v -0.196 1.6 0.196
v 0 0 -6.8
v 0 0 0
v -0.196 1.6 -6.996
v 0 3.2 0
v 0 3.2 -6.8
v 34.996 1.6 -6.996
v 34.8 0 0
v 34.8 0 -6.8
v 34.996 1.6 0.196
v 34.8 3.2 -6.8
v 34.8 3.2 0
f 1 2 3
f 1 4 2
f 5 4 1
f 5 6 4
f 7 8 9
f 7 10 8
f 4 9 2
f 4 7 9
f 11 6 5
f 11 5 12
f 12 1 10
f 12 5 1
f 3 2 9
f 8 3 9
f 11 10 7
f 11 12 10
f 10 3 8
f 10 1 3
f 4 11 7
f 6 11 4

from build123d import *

# Parameters (mm, degrees)
ESQUISSE1_W        = 34.8
ESQUISSE1_H        = 6.8
BOSS_EXTRU_1_DEPTH = 1.6
BOSS_EXTRU_1_TAPER = -7
ESQUISSE2_W        = 35.192910594
ESQUISSE2_H        = 7.192910594
BOSS_EXTRU_2_DEPTH = 1.6
BOSS_EXTRU_2_TAPER = 7


with BuildPart() as part:
    # Esquisse1 → Boss.-Extru.1 (new body)
    with BuildSketch(Plane(origin=(0, 0, 0), x_dir=(1, 0, 0), z_dir=(0, 1, 0))):
        with Locations((17.4, 3.4)):
            Rectangle(ESQUISSE1_W, ESQUISSE1_H)
    extrude(amount=BOSS_EXTRU_1_DEPTH, taper=BOSS_EXTRU_1_TAPER)

    # Esquisse2 → Boss.-Extru.2 (add)
    with BuildSketch(Plane(origin=(0, 1.6, 0), x_dir=(1, 0, 0), z_dir=(0, 1, 0))):
        with Locations((17.4, 3.4)):
            Rectangle(ESQUISSE2_W, ESQUISSE2_H)
    extrude(amount=BOSS_EXTRU_2_DEPTH, taper=BOSS_EXTRU_2_TAPER)


solid = part.part
